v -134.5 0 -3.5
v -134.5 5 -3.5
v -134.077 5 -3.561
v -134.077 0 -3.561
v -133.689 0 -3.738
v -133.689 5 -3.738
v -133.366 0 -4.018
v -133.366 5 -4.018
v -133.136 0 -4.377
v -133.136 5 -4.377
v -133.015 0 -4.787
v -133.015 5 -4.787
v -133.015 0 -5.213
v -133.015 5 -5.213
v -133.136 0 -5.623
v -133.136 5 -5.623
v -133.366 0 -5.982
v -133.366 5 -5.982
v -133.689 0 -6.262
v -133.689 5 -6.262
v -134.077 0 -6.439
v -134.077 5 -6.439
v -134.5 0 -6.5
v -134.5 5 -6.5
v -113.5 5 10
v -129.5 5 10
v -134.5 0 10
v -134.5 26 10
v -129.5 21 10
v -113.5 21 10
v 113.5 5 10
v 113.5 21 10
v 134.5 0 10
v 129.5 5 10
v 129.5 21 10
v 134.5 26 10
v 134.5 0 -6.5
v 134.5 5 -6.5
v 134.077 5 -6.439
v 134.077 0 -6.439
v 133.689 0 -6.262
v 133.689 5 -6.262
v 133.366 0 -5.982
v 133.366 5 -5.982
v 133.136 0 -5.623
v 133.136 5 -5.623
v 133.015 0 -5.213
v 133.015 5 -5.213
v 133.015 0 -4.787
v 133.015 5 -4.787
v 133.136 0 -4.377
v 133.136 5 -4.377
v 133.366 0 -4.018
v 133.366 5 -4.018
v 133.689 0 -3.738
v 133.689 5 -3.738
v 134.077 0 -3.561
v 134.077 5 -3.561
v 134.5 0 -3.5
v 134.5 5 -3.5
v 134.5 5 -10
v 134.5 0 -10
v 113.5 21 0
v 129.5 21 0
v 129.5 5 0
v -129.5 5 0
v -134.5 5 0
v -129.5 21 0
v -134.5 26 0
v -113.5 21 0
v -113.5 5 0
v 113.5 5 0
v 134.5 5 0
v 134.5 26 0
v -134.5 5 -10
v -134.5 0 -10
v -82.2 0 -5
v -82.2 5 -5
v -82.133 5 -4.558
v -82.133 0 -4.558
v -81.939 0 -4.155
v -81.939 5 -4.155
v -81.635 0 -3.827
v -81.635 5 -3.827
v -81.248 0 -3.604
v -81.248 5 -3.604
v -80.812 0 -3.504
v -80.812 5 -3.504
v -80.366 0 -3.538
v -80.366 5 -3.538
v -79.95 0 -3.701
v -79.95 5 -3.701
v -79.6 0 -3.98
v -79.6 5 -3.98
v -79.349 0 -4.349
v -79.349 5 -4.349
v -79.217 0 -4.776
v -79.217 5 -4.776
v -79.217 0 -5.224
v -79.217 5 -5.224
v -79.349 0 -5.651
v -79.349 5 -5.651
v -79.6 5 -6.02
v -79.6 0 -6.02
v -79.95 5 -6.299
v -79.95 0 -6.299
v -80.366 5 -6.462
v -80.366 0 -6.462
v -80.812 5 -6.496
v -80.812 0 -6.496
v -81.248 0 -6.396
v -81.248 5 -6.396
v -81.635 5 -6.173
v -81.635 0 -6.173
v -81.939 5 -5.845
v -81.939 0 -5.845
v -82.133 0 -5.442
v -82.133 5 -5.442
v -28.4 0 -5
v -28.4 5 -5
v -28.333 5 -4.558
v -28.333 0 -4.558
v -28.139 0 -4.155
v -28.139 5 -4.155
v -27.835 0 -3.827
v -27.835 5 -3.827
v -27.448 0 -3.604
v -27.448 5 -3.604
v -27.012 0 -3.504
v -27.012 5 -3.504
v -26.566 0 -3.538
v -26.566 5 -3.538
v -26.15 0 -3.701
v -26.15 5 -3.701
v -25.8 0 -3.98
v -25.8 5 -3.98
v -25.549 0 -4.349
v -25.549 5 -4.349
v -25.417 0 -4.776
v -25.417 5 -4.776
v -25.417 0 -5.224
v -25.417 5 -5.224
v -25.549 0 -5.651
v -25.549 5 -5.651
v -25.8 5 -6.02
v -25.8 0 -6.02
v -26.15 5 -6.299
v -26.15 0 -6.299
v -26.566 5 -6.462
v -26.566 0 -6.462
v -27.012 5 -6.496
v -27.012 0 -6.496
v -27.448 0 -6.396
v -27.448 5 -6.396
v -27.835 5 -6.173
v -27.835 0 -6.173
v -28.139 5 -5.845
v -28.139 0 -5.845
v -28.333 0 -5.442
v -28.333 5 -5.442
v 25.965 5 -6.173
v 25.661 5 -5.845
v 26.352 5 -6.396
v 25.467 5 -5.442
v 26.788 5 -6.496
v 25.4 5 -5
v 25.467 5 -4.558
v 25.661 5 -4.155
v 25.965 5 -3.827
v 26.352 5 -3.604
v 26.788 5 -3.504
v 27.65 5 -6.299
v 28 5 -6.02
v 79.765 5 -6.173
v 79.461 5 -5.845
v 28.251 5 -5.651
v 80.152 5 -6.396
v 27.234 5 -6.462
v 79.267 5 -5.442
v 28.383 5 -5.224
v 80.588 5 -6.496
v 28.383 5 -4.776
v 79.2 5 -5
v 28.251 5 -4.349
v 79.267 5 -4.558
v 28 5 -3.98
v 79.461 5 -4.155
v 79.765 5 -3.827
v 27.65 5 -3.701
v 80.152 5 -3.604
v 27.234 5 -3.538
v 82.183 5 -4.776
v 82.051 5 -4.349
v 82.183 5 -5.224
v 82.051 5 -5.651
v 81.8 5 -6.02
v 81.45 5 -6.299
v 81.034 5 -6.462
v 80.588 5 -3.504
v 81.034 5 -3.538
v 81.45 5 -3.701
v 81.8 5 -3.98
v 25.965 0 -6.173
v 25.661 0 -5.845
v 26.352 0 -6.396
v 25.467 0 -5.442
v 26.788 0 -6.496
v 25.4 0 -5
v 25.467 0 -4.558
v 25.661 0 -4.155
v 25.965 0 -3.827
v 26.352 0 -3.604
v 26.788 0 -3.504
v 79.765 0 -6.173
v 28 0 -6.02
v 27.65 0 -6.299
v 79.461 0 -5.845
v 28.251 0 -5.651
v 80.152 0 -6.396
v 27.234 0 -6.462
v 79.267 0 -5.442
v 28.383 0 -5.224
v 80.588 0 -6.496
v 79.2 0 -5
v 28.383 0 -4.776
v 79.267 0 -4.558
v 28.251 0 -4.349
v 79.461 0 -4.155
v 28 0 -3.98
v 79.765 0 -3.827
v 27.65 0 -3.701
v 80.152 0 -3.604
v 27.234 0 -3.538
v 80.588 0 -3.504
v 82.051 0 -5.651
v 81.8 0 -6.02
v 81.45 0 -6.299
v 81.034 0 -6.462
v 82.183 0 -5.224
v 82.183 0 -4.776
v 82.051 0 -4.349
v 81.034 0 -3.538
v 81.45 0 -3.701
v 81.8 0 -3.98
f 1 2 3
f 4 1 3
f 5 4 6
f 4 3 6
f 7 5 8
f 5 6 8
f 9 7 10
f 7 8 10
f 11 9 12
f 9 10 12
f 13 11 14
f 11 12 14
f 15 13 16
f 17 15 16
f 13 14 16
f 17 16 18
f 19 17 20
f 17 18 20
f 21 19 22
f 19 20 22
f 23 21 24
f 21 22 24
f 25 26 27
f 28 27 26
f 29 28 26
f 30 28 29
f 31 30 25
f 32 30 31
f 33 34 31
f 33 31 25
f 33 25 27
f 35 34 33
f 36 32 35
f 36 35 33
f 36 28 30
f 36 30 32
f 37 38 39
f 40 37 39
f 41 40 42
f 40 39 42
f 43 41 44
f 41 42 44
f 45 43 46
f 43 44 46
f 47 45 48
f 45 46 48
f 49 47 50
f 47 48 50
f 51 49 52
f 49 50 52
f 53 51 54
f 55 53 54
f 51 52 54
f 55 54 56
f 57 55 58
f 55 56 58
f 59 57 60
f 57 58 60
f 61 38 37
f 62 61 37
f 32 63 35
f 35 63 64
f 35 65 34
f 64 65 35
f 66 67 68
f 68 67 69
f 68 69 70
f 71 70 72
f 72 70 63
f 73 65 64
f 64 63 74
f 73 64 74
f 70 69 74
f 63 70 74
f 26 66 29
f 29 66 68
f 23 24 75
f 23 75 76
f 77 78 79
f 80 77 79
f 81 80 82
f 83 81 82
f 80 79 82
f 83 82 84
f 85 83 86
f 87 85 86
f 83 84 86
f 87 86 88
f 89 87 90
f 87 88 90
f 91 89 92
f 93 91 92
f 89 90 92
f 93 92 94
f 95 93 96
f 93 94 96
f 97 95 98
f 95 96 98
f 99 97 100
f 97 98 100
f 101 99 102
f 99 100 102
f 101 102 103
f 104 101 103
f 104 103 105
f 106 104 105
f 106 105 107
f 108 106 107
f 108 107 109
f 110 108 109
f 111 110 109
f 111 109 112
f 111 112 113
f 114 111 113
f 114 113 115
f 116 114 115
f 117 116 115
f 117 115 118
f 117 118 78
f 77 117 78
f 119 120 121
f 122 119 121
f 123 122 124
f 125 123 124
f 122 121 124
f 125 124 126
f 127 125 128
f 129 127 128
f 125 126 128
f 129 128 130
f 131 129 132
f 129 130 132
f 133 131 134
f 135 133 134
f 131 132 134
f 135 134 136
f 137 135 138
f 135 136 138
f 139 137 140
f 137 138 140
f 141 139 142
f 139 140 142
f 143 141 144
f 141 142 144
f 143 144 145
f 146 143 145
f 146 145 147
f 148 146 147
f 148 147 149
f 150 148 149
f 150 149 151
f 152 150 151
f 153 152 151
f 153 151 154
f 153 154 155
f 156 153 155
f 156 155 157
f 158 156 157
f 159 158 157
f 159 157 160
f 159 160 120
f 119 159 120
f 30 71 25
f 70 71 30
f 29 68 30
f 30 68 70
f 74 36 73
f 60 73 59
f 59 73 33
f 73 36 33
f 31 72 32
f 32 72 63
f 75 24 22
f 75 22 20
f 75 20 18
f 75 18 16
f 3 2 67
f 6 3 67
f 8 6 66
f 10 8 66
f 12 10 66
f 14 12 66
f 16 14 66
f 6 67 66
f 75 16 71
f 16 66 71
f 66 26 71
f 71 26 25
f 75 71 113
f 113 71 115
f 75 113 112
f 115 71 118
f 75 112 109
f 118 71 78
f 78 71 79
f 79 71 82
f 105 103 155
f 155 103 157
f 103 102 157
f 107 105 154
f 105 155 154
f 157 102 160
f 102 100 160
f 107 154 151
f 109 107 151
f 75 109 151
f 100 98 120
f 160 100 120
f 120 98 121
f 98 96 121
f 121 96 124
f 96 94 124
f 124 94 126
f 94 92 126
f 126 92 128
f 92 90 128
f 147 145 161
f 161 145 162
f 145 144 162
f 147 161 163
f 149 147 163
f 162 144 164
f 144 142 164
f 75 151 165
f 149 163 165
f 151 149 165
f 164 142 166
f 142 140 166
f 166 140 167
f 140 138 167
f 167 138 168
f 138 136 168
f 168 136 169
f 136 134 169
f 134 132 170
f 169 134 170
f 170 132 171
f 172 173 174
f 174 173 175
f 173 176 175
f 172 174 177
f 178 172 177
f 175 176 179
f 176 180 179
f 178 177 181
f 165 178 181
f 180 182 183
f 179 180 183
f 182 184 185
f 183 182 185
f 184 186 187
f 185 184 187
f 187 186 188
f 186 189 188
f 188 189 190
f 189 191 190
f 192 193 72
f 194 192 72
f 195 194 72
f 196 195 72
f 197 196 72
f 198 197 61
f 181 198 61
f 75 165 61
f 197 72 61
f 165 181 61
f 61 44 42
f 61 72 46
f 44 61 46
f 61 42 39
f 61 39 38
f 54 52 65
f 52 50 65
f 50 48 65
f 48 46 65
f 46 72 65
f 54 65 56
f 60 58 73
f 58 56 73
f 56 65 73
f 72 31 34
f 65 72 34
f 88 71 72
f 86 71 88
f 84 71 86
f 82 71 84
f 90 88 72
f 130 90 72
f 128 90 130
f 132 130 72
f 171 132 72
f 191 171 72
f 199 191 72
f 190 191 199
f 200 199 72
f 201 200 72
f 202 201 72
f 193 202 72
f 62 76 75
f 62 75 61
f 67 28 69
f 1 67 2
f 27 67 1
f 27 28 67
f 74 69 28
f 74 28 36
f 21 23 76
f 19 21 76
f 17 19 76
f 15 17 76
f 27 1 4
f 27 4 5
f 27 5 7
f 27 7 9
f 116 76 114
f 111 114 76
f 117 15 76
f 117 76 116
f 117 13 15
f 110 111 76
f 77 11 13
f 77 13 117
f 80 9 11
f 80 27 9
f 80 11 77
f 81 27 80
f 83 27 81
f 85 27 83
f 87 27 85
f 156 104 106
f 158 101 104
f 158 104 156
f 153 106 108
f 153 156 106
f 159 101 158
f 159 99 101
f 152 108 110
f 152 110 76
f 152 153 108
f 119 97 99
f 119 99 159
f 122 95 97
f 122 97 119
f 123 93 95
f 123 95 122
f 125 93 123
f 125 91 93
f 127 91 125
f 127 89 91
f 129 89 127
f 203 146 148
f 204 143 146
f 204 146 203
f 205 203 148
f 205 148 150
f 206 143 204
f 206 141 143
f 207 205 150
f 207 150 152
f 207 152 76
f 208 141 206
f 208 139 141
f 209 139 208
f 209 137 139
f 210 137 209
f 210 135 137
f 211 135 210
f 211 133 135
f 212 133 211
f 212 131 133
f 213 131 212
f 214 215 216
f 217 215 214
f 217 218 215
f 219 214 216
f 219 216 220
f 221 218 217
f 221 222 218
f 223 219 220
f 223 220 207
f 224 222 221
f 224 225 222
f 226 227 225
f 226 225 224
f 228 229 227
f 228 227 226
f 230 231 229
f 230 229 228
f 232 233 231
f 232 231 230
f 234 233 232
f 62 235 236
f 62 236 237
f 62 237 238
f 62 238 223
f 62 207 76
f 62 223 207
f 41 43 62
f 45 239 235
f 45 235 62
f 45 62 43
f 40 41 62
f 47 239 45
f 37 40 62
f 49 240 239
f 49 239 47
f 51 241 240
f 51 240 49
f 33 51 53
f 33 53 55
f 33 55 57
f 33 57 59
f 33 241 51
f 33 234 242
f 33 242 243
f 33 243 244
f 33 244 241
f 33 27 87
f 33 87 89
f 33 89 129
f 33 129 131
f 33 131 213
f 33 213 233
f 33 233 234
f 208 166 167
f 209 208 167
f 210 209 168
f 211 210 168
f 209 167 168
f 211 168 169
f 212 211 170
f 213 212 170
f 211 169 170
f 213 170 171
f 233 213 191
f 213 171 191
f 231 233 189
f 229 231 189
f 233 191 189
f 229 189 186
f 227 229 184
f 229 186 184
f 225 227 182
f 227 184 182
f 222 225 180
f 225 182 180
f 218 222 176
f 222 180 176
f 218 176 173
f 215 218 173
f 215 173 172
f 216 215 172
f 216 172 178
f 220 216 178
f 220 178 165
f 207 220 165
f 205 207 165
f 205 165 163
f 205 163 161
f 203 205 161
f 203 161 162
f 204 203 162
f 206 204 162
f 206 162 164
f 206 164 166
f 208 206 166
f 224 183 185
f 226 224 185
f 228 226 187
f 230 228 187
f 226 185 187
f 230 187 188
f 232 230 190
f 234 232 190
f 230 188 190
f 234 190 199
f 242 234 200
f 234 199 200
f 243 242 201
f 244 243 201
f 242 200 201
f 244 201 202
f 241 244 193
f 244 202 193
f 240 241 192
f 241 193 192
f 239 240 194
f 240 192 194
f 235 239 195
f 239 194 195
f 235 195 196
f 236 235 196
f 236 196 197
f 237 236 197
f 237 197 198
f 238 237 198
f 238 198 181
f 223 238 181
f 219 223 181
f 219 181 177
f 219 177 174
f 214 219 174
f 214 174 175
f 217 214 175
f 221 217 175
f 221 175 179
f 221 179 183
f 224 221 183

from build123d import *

# Parameters (mm, degrees)
SKETCH_W     = 269
SKETCH_H     = 26
SKETCH_W_2   = 16
SKETCH_H_2   = 16
PAD_DEPTH    = 10
SKETCH002_W  = 269
SKETCH002_H  = 5
PAD001_DEPTH = 10
SKETCH003_R  = 1.5
POCKET_DEPTH = 5.001


with BuildPart() as part:
    # Sketch → Pad (new body)
    with BuildSketch(Plane.XY):
        with Locations((0, 13)):
            Rectangle(SKETCH_W, SKETCH_H)
        with Locations((121.5, 13)):
            Rectangle(SKETCH_W_2, SKETCH_H_2, mode=Mode.SUBTRACT)
        with Locations((-121.5, 13)):
            Rectangle(SKETCH_W_2, SKETCH_H_2, mode=Mode.SUBTRACT)
    extrude(amount=PAD_DEPTH)

    # Sketch002 (on Face13 of Pad) → Pad001 (join)
    with BuildSketch(Plane(origin=(0, 0, 0), x_dir=(1, 0, 0), z_dir=(0, 0, -1))):
        with Locations((0, -2.5)):
            Rectangle(SKETCH002_W, SKETCH002_H)
    extrude(amount=PAD001_DEPTH)

    # Sketch003 (on Face9 of Pad001) → Pocket (cut, through all)
    with BuildSketch(Plane(origin=(0, 5, 0), x_dir=(-1, 0, 0), z_dir=(0, 1, 0))):
        with Locations((-134.5, -5)):
            Circle(SKETCH003_R)
        with Locations((-80.7, -5)):
            Circle(SKETCH003_R)
        with Locations((-26.9, -5)):
            Circle(SKETCH003_R)
        with Locations((26.9, -5)):
            Circle(SKETCH003_R)
        with Locations((80.7, -5)):
            Circle(SKETCH003_R)
        with Locations((134.5, -5)):
            Circle(SKETCH003_R)
    extrude(amount=-POCKET_DEPTH, mode=Mode.SUBTRACT)


solid = part.part
